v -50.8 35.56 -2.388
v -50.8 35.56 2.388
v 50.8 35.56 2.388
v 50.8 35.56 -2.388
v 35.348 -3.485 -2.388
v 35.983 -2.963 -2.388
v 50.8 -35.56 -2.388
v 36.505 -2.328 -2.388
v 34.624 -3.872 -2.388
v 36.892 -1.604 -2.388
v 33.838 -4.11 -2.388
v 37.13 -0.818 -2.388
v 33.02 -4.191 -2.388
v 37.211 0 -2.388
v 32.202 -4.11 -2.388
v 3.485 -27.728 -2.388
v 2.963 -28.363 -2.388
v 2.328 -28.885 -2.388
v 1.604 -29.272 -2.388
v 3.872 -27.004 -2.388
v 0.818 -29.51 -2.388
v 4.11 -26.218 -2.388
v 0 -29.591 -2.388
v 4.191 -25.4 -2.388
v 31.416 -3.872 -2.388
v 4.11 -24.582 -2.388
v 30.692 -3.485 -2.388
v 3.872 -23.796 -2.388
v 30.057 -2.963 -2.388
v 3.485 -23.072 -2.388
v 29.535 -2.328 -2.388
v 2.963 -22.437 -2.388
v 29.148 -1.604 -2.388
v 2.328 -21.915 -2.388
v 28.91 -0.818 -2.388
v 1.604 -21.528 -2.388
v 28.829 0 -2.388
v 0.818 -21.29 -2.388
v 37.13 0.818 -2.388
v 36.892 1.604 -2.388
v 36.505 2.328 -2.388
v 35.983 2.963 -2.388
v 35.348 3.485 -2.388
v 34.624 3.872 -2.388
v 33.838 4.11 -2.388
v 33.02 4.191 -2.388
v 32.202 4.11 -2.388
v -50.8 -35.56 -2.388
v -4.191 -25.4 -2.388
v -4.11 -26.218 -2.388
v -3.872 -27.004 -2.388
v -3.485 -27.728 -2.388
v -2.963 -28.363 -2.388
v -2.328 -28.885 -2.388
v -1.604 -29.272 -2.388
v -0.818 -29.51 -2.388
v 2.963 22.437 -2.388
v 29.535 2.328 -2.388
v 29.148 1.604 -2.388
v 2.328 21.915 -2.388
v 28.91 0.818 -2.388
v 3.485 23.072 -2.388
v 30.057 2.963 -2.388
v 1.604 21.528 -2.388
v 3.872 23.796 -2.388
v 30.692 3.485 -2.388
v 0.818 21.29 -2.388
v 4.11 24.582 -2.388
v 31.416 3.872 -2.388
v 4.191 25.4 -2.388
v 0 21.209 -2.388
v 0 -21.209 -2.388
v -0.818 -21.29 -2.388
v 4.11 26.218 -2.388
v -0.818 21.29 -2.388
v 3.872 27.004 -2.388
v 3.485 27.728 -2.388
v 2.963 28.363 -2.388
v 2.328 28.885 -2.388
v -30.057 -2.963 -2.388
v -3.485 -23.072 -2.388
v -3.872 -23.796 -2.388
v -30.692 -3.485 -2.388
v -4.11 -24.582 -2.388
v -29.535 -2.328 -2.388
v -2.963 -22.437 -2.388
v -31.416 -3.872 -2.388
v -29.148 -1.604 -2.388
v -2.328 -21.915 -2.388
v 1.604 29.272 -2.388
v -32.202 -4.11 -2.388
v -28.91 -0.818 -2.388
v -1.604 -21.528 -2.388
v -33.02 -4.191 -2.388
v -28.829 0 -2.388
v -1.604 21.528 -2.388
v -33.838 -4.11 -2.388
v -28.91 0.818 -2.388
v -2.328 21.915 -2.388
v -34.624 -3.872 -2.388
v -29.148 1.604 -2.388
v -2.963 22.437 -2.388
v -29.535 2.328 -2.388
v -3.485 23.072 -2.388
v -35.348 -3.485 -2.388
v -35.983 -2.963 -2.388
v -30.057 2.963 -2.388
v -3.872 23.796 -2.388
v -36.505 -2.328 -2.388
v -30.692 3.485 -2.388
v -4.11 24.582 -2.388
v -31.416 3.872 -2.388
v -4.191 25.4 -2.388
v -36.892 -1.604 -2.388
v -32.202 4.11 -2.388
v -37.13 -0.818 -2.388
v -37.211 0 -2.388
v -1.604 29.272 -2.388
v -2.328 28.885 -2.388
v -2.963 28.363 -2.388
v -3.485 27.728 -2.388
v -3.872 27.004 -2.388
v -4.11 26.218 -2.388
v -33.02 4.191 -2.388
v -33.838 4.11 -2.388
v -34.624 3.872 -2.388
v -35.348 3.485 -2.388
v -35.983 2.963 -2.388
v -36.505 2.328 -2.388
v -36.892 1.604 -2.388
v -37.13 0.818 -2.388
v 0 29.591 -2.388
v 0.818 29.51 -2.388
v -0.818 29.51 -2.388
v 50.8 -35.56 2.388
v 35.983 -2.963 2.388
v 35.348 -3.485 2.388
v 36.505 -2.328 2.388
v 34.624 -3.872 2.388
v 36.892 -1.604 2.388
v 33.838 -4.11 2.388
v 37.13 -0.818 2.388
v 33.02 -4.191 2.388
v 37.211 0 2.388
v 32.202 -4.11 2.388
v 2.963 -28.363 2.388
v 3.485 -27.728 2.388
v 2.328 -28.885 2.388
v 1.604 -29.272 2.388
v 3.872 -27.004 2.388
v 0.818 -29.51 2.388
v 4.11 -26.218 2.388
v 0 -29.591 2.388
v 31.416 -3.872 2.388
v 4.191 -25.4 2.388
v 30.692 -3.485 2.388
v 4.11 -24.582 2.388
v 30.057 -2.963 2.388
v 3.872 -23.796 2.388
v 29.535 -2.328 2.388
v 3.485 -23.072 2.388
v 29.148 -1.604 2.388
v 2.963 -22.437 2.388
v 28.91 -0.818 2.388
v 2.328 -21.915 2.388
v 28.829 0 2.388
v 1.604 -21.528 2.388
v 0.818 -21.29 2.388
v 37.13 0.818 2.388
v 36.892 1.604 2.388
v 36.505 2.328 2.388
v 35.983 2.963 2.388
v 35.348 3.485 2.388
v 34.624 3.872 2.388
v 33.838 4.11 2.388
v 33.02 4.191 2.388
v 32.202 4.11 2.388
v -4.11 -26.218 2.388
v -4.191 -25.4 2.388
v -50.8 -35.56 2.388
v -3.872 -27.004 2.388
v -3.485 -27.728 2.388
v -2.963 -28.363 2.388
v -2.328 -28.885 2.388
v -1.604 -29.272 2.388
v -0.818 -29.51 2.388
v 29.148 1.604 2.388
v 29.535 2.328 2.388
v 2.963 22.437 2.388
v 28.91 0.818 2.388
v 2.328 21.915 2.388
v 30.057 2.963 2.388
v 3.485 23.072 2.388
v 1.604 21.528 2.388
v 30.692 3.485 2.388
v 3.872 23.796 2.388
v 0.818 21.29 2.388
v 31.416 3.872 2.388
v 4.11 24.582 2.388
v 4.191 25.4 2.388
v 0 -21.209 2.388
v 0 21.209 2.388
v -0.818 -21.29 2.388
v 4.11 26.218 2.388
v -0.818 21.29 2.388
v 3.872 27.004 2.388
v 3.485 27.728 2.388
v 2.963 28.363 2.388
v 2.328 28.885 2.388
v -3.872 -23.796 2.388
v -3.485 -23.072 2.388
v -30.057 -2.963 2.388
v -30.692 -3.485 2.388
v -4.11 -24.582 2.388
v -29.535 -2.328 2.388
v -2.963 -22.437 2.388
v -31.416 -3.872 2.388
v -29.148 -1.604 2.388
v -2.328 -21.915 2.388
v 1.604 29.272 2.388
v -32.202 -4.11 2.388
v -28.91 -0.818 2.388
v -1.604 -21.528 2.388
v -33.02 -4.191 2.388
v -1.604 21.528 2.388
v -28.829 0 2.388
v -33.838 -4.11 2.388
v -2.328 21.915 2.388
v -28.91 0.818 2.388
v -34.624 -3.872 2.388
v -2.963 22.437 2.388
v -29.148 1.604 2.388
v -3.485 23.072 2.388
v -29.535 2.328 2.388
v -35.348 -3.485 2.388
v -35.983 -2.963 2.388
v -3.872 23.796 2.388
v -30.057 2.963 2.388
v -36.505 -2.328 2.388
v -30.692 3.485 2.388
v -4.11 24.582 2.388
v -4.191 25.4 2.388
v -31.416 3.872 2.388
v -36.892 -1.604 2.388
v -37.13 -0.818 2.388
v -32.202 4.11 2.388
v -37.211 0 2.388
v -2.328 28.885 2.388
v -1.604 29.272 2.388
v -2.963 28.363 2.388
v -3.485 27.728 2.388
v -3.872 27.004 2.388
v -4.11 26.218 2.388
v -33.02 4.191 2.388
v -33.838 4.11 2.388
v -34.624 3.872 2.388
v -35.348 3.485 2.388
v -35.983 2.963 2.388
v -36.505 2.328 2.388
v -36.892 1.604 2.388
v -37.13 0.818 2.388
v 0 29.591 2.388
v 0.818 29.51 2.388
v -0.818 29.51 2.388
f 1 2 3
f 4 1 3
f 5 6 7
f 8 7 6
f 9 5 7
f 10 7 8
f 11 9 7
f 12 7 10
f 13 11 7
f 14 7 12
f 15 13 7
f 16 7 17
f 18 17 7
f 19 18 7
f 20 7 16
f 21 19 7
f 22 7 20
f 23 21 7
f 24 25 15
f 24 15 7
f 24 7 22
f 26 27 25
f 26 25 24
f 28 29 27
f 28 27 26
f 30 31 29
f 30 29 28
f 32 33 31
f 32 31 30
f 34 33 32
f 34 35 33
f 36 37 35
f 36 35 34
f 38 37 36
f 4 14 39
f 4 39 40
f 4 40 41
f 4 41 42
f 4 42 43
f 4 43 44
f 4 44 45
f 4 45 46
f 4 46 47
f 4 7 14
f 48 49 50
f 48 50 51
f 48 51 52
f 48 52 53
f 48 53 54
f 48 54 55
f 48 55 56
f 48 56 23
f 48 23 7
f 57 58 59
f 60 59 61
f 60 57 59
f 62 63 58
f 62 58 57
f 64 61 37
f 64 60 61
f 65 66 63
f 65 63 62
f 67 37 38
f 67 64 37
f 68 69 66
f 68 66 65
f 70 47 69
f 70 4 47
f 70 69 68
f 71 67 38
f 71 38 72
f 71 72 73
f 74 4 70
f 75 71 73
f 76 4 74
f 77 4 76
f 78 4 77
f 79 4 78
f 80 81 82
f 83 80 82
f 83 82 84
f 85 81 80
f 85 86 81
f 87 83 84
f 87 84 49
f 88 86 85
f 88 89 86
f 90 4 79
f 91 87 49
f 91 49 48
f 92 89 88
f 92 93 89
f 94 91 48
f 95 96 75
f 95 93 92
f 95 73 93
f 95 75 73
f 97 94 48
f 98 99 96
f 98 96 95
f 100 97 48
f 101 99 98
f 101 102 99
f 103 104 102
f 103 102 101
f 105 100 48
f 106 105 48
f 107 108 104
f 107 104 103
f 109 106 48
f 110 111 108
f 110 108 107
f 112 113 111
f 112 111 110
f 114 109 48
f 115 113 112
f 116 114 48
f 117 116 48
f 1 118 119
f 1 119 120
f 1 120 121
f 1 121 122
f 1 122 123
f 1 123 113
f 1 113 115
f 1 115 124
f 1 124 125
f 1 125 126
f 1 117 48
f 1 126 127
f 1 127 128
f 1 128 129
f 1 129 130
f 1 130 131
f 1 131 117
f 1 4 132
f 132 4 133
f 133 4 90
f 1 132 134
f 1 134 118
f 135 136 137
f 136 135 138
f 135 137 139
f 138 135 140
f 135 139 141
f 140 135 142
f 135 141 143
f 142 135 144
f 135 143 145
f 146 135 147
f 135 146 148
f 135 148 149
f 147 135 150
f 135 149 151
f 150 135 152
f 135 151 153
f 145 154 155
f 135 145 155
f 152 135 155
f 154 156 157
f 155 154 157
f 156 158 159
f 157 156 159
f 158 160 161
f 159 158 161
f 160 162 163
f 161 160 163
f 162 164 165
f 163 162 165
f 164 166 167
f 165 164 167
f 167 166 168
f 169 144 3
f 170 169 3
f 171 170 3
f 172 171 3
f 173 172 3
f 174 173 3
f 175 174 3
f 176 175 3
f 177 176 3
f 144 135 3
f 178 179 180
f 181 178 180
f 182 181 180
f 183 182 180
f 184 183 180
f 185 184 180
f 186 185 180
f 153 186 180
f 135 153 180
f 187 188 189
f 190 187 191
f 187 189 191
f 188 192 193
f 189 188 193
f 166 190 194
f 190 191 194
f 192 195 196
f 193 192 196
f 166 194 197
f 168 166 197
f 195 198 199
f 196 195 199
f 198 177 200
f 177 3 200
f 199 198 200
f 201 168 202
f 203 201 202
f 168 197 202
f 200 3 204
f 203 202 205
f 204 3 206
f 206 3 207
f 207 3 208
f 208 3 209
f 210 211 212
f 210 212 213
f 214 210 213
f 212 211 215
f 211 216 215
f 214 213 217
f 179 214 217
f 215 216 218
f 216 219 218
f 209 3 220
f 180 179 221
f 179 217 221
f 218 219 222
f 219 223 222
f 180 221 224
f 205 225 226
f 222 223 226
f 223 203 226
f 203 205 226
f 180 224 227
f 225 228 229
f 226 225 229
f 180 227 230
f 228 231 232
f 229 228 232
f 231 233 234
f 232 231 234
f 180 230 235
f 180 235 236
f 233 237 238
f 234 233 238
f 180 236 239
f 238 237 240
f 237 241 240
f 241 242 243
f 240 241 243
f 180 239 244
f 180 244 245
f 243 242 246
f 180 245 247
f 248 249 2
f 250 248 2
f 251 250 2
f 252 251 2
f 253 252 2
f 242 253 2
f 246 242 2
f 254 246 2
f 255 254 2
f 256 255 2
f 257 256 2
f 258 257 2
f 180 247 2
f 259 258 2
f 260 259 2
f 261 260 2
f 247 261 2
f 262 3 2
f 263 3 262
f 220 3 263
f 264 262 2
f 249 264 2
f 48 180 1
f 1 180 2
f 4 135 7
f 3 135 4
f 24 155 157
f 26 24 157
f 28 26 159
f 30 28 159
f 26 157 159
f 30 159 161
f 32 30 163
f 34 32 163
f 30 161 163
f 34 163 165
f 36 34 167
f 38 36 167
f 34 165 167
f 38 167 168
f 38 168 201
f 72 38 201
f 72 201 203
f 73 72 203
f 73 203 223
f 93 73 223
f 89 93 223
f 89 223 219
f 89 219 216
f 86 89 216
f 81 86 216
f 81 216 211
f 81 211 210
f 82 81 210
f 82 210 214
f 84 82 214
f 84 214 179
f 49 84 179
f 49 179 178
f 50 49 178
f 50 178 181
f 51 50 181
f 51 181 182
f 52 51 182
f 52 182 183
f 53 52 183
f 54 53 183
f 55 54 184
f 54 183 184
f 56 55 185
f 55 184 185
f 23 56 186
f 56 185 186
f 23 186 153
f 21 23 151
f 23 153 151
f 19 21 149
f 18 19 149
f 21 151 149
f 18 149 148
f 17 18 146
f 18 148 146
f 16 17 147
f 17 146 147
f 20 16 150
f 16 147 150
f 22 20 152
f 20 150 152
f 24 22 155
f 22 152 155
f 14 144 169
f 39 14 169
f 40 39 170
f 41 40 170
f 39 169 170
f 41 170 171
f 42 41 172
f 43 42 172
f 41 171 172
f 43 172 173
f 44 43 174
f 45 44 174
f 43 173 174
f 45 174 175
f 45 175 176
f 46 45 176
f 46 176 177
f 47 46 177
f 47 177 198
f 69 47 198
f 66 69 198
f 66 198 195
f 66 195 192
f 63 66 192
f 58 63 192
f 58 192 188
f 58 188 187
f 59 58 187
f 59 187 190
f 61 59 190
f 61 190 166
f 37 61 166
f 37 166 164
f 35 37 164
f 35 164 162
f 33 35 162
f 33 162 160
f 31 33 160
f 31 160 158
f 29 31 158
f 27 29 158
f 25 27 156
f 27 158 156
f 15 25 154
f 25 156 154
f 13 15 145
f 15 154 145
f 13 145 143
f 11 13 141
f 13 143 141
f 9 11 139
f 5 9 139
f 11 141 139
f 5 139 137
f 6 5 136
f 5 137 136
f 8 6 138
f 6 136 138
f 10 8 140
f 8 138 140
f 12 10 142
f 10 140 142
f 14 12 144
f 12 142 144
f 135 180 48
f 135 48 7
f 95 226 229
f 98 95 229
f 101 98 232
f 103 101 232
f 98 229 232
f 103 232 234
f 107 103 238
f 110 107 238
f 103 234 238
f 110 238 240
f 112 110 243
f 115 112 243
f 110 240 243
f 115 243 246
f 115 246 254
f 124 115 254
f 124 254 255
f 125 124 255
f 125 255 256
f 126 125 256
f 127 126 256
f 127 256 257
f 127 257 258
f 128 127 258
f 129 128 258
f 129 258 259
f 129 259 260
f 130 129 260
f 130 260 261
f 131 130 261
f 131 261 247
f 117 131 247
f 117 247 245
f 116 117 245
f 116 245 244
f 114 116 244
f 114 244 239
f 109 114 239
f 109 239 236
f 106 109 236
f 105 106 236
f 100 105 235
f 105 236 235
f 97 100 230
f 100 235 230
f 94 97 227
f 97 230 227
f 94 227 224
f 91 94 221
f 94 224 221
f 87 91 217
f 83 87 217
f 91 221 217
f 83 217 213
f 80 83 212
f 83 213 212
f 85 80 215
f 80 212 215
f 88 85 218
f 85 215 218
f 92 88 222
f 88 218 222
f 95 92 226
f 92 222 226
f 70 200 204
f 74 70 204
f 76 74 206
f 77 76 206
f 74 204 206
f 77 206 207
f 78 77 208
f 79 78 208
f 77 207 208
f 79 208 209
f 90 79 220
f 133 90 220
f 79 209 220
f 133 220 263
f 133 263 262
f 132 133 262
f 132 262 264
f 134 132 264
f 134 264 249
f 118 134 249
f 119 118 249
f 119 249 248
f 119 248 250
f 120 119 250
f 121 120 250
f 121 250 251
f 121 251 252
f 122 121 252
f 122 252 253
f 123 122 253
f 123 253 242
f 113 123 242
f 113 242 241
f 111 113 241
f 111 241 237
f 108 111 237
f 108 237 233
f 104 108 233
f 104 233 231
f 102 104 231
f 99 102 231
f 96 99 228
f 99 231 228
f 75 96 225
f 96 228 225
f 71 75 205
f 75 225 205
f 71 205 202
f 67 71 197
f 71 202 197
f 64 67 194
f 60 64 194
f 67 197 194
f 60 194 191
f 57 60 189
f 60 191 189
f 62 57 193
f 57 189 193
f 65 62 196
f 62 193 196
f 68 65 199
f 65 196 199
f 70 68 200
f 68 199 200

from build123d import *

# Parameters (mm, degrees)
BOSS_EXTRUDE1_DEPTH      = 2.3876
BOSS_EXTRUDE1_DEPTH_BACK = 2.3876
SKETCH4_R                = 3.2639
CUT_EXTRUDE1_DEPTH       = 5.7752
SKETCH7_W                = 101.6
SKETCH7_H                = 101.6
BOSS_EXTRUDE2_DEPTH      = 4.7752
SKETCH10_R               = 4.191
CUT_EXTRUDE3_DEPTH       = 5.7752
SKETCH11_OUTSIDE_W       = 132.352
SKETCH11_OUTSIDE_H       = 132.352
SKETCH11_OUTSIDE_W_2     = 101.6
SKETCH11_OUTSIDE_H_2     = 71.12
CUT_EXTRUDE4_DEPTH       = 4.7752


with BuildPart() as part:
    # Sketch3 → Boss-Extrude1 (new body, two sides)
    with BuildSketch(Plane.XY) as boss_extrude1_sk:
        Polygon((50.8, -25.4), (50.8, -50.8), (-50.8, -50.8), (-50.8, 50.8), (-25.4, 50.8), align=None)
    extrude(amount=BOSS_EXTRUDE1_DEPTH)
    extrude(boss_extrude1_sk.sketch, amount=-BOSS_EXTRUDE1_DEPTH_BACK)

    # Sketch4 → Cut-Extrude1 (cut, through all)
    with BuildSketch(Plane.XY.offset(2.3876)):
        with Locations((-38.1, -38.1)):
            Circle(SKETCH4_R)
        with Locations((-12.7, -38.1)):
            Circle(SKETCH4_R)
        with Locations((12.7, -38.1)):
            Circle(SKETCH4_R)
        with Locations((-38.1, -12.7)):
            Circle(SKETCH4_R)
        with Locations((-38.1, 12.7)):
            Circle(SKETCH4_R)
        with Locations((38.1, -38.1)):
            Circle(SKETCH4_R)
        with Locations((-38.1, 38.1)):
            Circle(SKETCH4_R)
    extrude(amount=-CUT_EXTRUDE1_DEPTH, mode=Mode.SUBTRACT)

    # Sketch7 → Boss-Extrude2 (add)
    with BuildSketch(Plane.XY.offset(2.3876)):
        Rectangle(SKETCH7_W, SKETCH7_H)
    extrude(amount=-BOSS_EXTRUDE2_DEPTH)

    # Sketch10 → Cut-Extrude3 (cut, through all)
    with BuildSketch(Plane.XY.offset(2.3876)):
        with Locations((-33.02, 0)):
            Circle(SKETCH10_R)
        with Locations((33.02, 0)):
            Circle(SKETCH10_R)
        with Locations((0, 25.4)):
            Circle(SKETCH10_R)
        with Locations((0, -25.4)):
            Circle(SKETCH10_R)
    extrude(amount=-CUT_EXTRUDE3_DEPTH, mode=Mode.SUBTRACT)

    # Sketch11 outside → Cut-Extrude4 (cut)
    with BuildSketch(Plane.XY.offset(2.3876)):
        Rectangle(SKETCH11_OUTSIDE_W, SKETCH11_OUTSIDE_H)
        Rectangle(SKETCH11_OUTSIDE_W_2, SKETCH11_OUTSIDE_H_2, mode=Mode.SUBTRACT)
    extrude(amount=-CUT_EXTRUDE4_DEPTH, mode=Mode.SUBTRACT)


solid = part.part
